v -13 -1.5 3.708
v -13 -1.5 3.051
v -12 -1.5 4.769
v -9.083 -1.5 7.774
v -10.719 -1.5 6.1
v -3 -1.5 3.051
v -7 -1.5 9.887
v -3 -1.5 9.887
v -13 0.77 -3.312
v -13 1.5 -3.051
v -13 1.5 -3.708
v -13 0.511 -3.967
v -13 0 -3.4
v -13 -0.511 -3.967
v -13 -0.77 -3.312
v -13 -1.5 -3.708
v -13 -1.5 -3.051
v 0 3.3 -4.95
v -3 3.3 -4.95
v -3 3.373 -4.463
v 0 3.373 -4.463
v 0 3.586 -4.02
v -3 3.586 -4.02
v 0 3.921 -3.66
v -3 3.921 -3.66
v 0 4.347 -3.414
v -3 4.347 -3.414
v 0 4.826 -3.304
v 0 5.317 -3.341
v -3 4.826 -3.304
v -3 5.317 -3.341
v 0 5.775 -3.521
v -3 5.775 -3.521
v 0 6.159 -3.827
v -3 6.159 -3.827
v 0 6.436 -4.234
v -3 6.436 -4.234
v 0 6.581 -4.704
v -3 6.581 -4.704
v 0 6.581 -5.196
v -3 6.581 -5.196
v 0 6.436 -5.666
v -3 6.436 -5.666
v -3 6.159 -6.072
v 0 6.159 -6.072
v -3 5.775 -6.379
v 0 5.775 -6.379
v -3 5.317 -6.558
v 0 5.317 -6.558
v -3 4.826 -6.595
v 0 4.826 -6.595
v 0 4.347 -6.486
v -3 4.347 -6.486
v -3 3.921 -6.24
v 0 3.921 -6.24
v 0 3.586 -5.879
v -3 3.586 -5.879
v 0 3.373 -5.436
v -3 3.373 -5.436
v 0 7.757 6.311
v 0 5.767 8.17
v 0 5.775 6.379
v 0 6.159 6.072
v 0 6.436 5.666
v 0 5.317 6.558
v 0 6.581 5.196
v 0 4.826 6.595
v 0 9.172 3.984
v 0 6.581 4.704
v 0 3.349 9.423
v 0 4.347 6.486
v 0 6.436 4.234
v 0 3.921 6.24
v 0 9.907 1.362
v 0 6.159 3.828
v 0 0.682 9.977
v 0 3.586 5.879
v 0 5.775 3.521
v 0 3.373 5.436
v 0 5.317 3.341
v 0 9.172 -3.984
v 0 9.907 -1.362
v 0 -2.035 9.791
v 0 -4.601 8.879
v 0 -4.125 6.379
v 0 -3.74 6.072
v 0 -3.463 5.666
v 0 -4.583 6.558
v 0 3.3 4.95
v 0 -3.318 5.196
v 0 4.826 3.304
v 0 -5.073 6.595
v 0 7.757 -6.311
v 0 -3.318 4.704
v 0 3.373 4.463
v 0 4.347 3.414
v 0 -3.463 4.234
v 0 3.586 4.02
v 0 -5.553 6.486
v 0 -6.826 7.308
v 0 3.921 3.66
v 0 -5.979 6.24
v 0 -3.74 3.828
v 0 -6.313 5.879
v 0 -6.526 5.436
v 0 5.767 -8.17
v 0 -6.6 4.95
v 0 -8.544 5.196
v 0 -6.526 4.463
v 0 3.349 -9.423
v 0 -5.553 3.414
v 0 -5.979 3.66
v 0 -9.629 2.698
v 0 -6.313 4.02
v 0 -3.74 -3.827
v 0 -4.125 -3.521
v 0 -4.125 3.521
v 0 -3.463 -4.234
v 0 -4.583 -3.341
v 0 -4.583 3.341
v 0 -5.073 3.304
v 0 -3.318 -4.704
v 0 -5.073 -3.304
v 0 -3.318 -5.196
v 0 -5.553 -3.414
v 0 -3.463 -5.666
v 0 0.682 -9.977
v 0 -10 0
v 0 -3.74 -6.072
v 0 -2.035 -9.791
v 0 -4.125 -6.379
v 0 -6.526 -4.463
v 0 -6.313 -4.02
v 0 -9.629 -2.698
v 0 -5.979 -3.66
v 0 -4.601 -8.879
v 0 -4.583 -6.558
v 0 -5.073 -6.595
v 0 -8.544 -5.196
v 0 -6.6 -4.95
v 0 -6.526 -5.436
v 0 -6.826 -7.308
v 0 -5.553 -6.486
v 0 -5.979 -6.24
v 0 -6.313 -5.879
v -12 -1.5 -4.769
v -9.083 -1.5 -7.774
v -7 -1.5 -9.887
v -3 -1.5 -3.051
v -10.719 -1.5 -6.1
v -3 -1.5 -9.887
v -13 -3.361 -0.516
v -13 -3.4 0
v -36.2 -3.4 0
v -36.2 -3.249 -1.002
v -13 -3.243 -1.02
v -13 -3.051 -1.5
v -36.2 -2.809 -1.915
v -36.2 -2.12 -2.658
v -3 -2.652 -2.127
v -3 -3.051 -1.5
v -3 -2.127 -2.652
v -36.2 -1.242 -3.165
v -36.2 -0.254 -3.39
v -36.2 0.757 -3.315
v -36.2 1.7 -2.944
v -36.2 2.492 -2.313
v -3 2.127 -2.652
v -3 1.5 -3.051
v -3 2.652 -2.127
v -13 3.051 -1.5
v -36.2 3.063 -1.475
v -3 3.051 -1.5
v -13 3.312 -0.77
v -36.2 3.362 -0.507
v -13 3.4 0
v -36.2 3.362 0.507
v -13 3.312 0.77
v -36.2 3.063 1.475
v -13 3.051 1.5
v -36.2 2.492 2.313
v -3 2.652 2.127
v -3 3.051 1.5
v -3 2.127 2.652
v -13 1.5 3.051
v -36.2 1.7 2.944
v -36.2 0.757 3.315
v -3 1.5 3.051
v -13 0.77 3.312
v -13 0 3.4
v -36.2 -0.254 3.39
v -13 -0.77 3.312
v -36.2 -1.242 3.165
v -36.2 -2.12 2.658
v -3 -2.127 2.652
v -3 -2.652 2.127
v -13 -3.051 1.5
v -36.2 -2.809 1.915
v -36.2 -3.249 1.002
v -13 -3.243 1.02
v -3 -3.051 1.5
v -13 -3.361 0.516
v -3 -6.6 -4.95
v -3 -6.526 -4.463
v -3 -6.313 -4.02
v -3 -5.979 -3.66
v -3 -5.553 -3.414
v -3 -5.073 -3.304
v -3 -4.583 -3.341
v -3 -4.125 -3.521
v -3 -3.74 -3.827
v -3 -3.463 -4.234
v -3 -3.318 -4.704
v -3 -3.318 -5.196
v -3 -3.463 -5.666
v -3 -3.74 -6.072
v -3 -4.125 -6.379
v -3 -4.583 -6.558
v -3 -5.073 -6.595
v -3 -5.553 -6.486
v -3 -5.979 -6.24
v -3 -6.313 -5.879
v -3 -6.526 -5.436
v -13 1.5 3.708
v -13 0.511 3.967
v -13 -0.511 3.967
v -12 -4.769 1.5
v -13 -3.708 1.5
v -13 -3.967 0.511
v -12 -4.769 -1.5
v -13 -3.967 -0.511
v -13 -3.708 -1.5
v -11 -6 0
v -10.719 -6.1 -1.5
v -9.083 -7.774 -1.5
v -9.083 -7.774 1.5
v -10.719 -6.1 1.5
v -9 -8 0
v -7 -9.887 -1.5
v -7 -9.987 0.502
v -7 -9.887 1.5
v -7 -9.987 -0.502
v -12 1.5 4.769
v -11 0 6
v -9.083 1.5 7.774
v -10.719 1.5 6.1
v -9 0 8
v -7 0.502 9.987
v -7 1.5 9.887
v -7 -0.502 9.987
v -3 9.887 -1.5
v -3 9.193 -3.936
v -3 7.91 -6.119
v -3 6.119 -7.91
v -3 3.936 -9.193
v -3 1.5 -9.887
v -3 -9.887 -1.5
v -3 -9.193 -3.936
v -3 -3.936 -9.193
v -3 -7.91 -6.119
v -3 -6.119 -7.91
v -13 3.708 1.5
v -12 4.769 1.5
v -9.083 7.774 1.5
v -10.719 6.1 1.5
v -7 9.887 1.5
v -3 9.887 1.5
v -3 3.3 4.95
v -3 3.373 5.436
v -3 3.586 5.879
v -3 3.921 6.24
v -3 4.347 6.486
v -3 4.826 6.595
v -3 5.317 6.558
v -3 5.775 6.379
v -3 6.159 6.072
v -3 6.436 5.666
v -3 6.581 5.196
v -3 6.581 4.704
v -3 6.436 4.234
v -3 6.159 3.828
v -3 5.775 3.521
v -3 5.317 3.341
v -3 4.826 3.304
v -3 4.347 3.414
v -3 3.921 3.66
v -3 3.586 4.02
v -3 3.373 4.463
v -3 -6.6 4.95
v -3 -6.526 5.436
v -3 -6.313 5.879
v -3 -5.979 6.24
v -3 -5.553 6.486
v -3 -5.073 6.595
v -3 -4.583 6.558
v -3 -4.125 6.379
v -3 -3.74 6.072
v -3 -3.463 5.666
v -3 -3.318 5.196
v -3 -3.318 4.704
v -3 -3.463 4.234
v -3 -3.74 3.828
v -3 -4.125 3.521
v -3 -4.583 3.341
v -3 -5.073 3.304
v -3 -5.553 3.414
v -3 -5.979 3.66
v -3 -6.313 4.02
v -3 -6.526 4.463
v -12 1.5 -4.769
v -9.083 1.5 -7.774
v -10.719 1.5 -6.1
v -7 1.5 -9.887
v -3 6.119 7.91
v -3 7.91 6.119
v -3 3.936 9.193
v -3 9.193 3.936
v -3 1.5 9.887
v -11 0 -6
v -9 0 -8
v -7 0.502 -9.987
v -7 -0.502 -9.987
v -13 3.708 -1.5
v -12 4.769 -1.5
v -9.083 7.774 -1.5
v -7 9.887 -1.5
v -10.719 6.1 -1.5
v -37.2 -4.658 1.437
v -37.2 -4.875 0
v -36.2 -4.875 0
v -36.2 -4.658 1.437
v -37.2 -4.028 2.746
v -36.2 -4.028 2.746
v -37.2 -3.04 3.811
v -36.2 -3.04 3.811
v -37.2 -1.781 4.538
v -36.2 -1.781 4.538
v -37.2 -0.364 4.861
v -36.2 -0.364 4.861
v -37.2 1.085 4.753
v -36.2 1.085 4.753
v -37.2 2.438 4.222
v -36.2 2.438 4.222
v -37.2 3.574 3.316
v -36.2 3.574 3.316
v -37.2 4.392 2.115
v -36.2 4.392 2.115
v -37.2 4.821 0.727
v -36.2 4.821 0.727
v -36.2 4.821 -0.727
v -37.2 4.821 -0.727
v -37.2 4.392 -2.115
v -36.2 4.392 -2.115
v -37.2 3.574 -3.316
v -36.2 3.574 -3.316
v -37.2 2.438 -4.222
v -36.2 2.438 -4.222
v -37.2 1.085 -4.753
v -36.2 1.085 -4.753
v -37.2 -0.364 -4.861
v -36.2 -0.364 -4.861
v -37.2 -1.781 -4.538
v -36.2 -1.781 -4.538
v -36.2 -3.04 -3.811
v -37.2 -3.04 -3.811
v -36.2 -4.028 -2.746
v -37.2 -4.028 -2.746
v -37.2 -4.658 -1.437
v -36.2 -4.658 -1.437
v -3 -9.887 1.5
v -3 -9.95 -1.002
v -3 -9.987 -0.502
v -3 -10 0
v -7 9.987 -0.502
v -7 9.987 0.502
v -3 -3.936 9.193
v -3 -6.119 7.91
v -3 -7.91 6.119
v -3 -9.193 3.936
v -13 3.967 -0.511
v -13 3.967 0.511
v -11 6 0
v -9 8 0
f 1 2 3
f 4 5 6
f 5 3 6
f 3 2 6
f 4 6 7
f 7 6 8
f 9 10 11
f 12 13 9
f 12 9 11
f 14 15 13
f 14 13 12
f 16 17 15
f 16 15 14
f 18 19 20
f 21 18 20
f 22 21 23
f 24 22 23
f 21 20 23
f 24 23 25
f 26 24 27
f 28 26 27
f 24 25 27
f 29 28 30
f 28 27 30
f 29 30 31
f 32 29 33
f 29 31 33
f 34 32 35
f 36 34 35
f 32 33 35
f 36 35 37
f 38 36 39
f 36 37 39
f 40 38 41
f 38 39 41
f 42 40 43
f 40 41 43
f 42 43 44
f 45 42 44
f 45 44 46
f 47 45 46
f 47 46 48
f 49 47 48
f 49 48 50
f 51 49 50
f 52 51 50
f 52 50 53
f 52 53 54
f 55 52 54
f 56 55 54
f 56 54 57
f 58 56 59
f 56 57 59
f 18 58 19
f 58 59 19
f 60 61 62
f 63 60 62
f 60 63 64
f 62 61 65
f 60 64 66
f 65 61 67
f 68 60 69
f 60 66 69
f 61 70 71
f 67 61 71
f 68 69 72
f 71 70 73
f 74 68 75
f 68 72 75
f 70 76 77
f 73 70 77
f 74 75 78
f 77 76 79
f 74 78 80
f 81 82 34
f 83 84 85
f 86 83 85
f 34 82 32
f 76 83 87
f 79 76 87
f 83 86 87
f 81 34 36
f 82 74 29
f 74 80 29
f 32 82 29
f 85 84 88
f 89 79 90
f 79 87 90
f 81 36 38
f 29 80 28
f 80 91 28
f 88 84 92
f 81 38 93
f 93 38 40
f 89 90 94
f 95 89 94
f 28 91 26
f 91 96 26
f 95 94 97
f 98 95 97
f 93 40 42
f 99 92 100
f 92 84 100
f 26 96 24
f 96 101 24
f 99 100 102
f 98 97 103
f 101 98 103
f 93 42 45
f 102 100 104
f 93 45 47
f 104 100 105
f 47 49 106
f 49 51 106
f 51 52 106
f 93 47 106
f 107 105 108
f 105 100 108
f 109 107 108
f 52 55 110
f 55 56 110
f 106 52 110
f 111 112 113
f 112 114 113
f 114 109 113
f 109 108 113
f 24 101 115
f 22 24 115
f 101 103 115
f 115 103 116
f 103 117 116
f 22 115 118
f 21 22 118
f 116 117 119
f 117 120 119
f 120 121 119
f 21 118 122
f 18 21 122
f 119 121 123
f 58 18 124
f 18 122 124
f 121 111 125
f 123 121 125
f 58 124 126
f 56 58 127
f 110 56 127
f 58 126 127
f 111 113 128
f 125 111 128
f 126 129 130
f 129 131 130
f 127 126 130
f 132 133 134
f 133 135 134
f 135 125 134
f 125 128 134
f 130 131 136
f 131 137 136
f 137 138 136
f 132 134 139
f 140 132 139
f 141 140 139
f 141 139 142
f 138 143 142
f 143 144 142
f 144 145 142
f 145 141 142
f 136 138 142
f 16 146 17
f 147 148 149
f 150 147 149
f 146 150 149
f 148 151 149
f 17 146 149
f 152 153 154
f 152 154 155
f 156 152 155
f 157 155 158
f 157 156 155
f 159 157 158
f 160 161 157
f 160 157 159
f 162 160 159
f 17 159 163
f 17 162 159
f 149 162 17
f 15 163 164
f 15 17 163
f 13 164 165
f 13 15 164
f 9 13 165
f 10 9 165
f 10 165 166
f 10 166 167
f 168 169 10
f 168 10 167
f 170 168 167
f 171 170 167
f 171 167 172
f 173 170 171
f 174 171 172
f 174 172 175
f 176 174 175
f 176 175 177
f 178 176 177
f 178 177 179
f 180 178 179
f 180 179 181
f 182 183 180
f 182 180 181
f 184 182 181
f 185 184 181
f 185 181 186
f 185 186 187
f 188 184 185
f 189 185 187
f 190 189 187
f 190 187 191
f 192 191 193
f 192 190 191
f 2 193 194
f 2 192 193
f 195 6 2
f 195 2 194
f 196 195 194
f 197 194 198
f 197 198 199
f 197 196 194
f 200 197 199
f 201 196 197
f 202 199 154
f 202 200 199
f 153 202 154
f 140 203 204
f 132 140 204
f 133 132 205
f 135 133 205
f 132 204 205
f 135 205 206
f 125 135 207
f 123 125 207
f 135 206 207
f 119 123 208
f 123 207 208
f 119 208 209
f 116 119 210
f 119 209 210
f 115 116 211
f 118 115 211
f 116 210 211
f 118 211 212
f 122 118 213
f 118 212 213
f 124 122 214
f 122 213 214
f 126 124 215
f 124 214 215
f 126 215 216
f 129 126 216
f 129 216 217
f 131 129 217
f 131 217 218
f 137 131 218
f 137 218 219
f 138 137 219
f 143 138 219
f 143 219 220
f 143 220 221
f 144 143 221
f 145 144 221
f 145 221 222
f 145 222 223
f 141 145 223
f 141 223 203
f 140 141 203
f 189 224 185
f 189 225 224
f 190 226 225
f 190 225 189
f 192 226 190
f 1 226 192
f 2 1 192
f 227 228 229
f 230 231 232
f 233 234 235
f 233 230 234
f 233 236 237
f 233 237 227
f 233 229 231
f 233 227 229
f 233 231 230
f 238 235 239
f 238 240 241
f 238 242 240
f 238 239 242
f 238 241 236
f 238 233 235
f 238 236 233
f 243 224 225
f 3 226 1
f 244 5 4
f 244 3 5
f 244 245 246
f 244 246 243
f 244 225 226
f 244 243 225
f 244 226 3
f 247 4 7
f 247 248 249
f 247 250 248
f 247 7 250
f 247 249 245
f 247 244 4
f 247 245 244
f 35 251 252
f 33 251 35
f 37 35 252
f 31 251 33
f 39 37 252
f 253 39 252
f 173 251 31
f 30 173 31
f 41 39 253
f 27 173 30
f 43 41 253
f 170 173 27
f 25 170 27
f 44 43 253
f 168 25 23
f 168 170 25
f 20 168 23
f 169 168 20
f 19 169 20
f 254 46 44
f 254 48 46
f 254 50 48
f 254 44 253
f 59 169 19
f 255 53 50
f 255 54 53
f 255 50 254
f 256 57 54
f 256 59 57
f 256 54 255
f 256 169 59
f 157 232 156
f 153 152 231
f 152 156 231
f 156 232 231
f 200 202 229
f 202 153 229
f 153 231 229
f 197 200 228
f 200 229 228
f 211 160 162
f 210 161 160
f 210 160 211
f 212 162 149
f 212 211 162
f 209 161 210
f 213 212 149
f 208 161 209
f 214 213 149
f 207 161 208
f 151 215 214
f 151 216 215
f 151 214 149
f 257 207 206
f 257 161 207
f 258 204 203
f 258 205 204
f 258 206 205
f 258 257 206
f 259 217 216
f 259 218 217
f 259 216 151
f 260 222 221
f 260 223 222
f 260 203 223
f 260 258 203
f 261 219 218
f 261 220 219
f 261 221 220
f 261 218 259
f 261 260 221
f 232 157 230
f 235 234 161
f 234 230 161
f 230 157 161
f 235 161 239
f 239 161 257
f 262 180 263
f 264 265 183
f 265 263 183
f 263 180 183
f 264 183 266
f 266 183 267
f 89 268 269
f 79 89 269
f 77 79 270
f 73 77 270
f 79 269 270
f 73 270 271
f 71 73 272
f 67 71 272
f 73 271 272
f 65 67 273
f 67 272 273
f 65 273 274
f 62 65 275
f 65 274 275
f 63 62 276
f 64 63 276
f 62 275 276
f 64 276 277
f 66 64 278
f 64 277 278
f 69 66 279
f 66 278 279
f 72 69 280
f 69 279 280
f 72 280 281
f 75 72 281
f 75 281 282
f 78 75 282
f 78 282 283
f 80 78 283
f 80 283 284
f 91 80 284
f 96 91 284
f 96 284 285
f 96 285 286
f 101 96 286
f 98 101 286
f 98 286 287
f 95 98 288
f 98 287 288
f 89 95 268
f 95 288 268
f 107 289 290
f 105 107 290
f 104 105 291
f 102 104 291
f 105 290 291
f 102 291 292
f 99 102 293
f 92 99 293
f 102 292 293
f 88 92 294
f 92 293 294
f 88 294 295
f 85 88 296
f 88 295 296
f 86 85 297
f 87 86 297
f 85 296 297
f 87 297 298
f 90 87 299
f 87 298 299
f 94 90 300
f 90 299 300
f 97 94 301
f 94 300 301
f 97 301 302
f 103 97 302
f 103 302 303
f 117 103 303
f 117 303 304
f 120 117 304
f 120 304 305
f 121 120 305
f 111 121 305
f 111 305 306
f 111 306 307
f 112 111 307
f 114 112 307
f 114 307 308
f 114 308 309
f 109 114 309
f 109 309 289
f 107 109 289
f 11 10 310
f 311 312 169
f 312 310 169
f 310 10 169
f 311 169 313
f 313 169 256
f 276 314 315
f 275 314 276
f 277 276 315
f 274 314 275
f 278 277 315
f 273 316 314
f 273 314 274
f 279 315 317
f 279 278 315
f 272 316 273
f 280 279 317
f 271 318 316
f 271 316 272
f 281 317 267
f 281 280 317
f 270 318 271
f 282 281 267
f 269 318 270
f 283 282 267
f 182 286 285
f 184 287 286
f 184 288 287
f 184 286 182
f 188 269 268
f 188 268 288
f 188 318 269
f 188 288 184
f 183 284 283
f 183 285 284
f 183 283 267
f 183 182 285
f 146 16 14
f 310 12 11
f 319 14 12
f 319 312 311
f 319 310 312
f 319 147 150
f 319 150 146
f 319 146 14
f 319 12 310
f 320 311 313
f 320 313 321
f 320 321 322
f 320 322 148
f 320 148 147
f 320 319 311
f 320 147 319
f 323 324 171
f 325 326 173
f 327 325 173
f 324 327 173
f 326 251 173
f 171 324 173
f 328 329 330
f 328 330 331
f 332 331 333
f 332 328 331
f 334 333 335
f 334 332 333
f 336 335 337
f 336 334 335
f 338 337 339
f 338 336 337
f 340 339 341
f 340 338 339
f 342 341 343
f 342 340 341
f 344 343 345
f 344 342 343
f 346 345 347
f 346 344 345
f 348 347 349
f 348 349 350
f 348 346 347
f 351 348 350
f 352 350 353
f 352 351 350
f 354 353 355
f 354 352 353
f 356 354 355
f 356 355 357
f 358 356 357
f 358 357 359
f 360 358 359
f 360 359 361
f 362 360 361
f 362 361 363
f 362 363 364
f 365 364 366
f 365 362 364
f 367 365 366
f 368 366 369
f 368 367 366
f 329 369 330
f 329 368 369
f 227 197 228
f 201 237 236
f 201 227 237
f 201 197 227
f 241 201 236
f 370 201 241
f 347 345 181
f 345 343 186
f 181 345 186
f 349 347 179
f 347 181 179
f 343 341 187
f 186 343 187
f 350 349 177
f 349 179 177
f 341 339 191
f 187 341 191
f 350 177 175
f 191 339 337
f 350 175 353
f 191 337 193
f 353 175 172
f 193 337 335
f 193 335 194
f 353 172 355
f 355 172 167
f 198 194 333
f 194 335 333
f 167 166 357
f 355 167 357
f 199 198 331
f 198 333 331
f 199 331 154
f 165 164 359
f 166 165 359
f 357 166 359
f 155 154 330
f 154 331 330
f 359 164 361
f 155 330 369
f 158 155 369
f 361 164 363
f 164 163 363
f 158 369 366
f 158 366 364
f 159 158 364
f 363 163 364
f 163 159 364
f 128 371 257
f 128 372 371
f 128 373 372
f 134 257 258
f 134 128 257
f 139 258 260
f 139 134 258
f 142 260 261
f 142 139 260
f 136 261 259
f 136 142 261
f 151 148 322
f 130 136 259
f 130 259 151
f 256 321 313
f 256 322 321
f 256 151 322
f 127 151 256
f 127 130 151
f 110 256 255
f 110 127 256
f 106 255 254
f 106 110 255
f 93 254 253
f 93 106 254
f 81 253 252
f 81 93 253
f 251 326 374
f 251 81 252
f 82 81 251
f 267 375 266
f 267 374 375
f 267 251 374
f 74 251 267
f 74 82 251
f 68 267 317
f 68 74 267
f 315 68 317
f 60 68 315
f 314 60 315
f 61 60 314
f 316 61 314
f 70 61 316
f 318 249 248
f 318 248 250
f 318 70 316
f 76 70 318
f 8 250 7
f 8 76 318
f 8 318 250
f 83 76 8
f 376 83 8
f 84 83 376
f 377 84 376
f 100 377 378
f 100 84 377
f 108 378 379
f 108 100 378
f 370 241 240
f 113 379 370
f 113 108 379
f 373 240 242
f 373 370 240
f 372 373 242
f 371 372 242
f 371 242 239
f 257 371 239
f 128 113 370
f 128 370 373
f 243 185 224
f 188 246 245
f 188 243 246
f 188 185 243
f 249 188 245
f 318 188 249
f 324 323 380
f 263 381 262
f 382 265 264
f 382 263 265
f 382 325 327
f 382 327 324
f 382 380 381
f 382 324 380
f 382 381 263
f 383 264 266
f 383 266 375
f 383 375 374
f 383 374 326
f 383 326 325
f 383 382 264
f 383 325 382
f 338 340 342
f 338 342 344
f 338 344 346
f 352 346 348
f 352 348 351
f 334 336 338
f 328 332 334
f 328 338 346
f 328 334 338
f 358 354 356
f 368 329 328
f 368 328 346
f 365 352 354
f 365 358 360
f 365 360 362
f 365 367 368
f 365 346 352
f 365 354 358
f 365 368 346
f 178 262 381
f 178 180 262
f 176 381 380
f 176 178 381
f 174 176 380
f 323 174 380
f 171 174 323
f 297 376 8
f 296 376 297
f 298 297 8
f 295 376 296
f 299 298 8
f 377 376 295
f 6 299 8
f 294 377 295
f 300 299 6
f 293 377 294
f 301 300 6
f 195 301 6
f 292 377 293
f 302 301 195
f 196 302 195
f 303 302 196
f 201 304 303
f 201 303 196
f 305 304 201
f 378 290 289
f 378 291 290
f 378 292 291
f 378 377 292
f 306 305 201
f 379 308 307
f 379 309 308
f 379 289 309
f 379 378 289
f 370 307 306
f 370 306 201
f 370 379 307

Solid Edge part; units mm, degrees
sketch "Sketch1" plane through (0, 0, 0) normal (-1, 0, 0) x (0, -1, 0)
  circle A0 centre (0, 0) radius 10
extrude "Protrusion1" add sketch "Sketch1" along normal blind 3
sketch "Sketch2" plane through (-3, 0, 0) normal (-1, 0, 0) x (0, -1, 0)
  circle A0 centre (0, 0) radius 3.4
extrude "Protrusion2" add sketch "Sketch2" along normal blind 34.2
sketch "Sketch3" plane through (-3, 0, 0) normal (-1, 0, 0) x (0, -1, 0)
  line L0 (3.0512, 1.5) -> (9.8869, 1.5)
  arc A0 (9.8869, 1.5) -> (9.8869, -1.5) centre (0, 0) cw
  line L1 (3.0512, -1.5) -> (9.8869, -1.5)
  line L2 (3.0512, 1.5) -> (3.0512, -1.5)
  line L3 (1.5, 3.0512) -> (1.5, 9.8869)
  arc A1 (-1.5, 9.8869) -> (1.5, 9.8869) centre (0, 0) cw
  line L4 (-1.5, 3.0512) -> (-1.5, 9.8869)
  line L5 (-1.5, 3.0512) -> (1.5, 3.0512)
  line L6 (-3.0512, 1.5) -> (-9.8869, 1.5)
  arc A2 (-9.8869, 1.5) -> (-9.8869, -1.5) centre (0, 0) ccw
  line L7 (-9.8869, -1.5) -> (-3.0512, -1.5)
  line L8 (-3.0512, -1.5) -> (-3.0512, 1.5)
  line L9 (-1.5, -3.0512) -> (-1.5, -9.8869)
  arc A3 (-1.5, -9.8869) -> (1.5, -9.8869) centre (0, 0) ccw
  line L10 (1.5, -9.8869) -> (1.5, -3.0512)
  line L11 (1.5, -3.0512) -> (-1.5, -3.0512)
extrude "Protrusion3" add sketch "Sketch3" along normal blind 10
chamfer "Chamfer1" distance 6 angle 45 4 edges at (-13, -10, 0) (-13, 0, 10) (-13, 10, 0) (-13, 0, -10)
sketch "Sketch4" plane through (-3, 5.9983, -5.9983) normal (-1, 0, 0) x (0, -1, 0)
  circle A0 centre (1.0486, 1.0486) radius 1.65
  circle A1 centre (10.9481, 1.0486) radius 1.65
  circle A2 centre (10.9481, 10.9481) radius 1.65
  circle A3 centre (1.0486, 10.9481) radius 1.65
extrude "Cutout1" cut sketch "Sketch4" against normal up to next
sketch "Sketch5" plane through (-37.2, 0, 0) normal (-1, 0, 0) x (0, -1, 0)
  circle A0 centre (0, 0) radius 4.875
extrude "Protrusion4" add sketch "Sketch5" against normal blind 1
